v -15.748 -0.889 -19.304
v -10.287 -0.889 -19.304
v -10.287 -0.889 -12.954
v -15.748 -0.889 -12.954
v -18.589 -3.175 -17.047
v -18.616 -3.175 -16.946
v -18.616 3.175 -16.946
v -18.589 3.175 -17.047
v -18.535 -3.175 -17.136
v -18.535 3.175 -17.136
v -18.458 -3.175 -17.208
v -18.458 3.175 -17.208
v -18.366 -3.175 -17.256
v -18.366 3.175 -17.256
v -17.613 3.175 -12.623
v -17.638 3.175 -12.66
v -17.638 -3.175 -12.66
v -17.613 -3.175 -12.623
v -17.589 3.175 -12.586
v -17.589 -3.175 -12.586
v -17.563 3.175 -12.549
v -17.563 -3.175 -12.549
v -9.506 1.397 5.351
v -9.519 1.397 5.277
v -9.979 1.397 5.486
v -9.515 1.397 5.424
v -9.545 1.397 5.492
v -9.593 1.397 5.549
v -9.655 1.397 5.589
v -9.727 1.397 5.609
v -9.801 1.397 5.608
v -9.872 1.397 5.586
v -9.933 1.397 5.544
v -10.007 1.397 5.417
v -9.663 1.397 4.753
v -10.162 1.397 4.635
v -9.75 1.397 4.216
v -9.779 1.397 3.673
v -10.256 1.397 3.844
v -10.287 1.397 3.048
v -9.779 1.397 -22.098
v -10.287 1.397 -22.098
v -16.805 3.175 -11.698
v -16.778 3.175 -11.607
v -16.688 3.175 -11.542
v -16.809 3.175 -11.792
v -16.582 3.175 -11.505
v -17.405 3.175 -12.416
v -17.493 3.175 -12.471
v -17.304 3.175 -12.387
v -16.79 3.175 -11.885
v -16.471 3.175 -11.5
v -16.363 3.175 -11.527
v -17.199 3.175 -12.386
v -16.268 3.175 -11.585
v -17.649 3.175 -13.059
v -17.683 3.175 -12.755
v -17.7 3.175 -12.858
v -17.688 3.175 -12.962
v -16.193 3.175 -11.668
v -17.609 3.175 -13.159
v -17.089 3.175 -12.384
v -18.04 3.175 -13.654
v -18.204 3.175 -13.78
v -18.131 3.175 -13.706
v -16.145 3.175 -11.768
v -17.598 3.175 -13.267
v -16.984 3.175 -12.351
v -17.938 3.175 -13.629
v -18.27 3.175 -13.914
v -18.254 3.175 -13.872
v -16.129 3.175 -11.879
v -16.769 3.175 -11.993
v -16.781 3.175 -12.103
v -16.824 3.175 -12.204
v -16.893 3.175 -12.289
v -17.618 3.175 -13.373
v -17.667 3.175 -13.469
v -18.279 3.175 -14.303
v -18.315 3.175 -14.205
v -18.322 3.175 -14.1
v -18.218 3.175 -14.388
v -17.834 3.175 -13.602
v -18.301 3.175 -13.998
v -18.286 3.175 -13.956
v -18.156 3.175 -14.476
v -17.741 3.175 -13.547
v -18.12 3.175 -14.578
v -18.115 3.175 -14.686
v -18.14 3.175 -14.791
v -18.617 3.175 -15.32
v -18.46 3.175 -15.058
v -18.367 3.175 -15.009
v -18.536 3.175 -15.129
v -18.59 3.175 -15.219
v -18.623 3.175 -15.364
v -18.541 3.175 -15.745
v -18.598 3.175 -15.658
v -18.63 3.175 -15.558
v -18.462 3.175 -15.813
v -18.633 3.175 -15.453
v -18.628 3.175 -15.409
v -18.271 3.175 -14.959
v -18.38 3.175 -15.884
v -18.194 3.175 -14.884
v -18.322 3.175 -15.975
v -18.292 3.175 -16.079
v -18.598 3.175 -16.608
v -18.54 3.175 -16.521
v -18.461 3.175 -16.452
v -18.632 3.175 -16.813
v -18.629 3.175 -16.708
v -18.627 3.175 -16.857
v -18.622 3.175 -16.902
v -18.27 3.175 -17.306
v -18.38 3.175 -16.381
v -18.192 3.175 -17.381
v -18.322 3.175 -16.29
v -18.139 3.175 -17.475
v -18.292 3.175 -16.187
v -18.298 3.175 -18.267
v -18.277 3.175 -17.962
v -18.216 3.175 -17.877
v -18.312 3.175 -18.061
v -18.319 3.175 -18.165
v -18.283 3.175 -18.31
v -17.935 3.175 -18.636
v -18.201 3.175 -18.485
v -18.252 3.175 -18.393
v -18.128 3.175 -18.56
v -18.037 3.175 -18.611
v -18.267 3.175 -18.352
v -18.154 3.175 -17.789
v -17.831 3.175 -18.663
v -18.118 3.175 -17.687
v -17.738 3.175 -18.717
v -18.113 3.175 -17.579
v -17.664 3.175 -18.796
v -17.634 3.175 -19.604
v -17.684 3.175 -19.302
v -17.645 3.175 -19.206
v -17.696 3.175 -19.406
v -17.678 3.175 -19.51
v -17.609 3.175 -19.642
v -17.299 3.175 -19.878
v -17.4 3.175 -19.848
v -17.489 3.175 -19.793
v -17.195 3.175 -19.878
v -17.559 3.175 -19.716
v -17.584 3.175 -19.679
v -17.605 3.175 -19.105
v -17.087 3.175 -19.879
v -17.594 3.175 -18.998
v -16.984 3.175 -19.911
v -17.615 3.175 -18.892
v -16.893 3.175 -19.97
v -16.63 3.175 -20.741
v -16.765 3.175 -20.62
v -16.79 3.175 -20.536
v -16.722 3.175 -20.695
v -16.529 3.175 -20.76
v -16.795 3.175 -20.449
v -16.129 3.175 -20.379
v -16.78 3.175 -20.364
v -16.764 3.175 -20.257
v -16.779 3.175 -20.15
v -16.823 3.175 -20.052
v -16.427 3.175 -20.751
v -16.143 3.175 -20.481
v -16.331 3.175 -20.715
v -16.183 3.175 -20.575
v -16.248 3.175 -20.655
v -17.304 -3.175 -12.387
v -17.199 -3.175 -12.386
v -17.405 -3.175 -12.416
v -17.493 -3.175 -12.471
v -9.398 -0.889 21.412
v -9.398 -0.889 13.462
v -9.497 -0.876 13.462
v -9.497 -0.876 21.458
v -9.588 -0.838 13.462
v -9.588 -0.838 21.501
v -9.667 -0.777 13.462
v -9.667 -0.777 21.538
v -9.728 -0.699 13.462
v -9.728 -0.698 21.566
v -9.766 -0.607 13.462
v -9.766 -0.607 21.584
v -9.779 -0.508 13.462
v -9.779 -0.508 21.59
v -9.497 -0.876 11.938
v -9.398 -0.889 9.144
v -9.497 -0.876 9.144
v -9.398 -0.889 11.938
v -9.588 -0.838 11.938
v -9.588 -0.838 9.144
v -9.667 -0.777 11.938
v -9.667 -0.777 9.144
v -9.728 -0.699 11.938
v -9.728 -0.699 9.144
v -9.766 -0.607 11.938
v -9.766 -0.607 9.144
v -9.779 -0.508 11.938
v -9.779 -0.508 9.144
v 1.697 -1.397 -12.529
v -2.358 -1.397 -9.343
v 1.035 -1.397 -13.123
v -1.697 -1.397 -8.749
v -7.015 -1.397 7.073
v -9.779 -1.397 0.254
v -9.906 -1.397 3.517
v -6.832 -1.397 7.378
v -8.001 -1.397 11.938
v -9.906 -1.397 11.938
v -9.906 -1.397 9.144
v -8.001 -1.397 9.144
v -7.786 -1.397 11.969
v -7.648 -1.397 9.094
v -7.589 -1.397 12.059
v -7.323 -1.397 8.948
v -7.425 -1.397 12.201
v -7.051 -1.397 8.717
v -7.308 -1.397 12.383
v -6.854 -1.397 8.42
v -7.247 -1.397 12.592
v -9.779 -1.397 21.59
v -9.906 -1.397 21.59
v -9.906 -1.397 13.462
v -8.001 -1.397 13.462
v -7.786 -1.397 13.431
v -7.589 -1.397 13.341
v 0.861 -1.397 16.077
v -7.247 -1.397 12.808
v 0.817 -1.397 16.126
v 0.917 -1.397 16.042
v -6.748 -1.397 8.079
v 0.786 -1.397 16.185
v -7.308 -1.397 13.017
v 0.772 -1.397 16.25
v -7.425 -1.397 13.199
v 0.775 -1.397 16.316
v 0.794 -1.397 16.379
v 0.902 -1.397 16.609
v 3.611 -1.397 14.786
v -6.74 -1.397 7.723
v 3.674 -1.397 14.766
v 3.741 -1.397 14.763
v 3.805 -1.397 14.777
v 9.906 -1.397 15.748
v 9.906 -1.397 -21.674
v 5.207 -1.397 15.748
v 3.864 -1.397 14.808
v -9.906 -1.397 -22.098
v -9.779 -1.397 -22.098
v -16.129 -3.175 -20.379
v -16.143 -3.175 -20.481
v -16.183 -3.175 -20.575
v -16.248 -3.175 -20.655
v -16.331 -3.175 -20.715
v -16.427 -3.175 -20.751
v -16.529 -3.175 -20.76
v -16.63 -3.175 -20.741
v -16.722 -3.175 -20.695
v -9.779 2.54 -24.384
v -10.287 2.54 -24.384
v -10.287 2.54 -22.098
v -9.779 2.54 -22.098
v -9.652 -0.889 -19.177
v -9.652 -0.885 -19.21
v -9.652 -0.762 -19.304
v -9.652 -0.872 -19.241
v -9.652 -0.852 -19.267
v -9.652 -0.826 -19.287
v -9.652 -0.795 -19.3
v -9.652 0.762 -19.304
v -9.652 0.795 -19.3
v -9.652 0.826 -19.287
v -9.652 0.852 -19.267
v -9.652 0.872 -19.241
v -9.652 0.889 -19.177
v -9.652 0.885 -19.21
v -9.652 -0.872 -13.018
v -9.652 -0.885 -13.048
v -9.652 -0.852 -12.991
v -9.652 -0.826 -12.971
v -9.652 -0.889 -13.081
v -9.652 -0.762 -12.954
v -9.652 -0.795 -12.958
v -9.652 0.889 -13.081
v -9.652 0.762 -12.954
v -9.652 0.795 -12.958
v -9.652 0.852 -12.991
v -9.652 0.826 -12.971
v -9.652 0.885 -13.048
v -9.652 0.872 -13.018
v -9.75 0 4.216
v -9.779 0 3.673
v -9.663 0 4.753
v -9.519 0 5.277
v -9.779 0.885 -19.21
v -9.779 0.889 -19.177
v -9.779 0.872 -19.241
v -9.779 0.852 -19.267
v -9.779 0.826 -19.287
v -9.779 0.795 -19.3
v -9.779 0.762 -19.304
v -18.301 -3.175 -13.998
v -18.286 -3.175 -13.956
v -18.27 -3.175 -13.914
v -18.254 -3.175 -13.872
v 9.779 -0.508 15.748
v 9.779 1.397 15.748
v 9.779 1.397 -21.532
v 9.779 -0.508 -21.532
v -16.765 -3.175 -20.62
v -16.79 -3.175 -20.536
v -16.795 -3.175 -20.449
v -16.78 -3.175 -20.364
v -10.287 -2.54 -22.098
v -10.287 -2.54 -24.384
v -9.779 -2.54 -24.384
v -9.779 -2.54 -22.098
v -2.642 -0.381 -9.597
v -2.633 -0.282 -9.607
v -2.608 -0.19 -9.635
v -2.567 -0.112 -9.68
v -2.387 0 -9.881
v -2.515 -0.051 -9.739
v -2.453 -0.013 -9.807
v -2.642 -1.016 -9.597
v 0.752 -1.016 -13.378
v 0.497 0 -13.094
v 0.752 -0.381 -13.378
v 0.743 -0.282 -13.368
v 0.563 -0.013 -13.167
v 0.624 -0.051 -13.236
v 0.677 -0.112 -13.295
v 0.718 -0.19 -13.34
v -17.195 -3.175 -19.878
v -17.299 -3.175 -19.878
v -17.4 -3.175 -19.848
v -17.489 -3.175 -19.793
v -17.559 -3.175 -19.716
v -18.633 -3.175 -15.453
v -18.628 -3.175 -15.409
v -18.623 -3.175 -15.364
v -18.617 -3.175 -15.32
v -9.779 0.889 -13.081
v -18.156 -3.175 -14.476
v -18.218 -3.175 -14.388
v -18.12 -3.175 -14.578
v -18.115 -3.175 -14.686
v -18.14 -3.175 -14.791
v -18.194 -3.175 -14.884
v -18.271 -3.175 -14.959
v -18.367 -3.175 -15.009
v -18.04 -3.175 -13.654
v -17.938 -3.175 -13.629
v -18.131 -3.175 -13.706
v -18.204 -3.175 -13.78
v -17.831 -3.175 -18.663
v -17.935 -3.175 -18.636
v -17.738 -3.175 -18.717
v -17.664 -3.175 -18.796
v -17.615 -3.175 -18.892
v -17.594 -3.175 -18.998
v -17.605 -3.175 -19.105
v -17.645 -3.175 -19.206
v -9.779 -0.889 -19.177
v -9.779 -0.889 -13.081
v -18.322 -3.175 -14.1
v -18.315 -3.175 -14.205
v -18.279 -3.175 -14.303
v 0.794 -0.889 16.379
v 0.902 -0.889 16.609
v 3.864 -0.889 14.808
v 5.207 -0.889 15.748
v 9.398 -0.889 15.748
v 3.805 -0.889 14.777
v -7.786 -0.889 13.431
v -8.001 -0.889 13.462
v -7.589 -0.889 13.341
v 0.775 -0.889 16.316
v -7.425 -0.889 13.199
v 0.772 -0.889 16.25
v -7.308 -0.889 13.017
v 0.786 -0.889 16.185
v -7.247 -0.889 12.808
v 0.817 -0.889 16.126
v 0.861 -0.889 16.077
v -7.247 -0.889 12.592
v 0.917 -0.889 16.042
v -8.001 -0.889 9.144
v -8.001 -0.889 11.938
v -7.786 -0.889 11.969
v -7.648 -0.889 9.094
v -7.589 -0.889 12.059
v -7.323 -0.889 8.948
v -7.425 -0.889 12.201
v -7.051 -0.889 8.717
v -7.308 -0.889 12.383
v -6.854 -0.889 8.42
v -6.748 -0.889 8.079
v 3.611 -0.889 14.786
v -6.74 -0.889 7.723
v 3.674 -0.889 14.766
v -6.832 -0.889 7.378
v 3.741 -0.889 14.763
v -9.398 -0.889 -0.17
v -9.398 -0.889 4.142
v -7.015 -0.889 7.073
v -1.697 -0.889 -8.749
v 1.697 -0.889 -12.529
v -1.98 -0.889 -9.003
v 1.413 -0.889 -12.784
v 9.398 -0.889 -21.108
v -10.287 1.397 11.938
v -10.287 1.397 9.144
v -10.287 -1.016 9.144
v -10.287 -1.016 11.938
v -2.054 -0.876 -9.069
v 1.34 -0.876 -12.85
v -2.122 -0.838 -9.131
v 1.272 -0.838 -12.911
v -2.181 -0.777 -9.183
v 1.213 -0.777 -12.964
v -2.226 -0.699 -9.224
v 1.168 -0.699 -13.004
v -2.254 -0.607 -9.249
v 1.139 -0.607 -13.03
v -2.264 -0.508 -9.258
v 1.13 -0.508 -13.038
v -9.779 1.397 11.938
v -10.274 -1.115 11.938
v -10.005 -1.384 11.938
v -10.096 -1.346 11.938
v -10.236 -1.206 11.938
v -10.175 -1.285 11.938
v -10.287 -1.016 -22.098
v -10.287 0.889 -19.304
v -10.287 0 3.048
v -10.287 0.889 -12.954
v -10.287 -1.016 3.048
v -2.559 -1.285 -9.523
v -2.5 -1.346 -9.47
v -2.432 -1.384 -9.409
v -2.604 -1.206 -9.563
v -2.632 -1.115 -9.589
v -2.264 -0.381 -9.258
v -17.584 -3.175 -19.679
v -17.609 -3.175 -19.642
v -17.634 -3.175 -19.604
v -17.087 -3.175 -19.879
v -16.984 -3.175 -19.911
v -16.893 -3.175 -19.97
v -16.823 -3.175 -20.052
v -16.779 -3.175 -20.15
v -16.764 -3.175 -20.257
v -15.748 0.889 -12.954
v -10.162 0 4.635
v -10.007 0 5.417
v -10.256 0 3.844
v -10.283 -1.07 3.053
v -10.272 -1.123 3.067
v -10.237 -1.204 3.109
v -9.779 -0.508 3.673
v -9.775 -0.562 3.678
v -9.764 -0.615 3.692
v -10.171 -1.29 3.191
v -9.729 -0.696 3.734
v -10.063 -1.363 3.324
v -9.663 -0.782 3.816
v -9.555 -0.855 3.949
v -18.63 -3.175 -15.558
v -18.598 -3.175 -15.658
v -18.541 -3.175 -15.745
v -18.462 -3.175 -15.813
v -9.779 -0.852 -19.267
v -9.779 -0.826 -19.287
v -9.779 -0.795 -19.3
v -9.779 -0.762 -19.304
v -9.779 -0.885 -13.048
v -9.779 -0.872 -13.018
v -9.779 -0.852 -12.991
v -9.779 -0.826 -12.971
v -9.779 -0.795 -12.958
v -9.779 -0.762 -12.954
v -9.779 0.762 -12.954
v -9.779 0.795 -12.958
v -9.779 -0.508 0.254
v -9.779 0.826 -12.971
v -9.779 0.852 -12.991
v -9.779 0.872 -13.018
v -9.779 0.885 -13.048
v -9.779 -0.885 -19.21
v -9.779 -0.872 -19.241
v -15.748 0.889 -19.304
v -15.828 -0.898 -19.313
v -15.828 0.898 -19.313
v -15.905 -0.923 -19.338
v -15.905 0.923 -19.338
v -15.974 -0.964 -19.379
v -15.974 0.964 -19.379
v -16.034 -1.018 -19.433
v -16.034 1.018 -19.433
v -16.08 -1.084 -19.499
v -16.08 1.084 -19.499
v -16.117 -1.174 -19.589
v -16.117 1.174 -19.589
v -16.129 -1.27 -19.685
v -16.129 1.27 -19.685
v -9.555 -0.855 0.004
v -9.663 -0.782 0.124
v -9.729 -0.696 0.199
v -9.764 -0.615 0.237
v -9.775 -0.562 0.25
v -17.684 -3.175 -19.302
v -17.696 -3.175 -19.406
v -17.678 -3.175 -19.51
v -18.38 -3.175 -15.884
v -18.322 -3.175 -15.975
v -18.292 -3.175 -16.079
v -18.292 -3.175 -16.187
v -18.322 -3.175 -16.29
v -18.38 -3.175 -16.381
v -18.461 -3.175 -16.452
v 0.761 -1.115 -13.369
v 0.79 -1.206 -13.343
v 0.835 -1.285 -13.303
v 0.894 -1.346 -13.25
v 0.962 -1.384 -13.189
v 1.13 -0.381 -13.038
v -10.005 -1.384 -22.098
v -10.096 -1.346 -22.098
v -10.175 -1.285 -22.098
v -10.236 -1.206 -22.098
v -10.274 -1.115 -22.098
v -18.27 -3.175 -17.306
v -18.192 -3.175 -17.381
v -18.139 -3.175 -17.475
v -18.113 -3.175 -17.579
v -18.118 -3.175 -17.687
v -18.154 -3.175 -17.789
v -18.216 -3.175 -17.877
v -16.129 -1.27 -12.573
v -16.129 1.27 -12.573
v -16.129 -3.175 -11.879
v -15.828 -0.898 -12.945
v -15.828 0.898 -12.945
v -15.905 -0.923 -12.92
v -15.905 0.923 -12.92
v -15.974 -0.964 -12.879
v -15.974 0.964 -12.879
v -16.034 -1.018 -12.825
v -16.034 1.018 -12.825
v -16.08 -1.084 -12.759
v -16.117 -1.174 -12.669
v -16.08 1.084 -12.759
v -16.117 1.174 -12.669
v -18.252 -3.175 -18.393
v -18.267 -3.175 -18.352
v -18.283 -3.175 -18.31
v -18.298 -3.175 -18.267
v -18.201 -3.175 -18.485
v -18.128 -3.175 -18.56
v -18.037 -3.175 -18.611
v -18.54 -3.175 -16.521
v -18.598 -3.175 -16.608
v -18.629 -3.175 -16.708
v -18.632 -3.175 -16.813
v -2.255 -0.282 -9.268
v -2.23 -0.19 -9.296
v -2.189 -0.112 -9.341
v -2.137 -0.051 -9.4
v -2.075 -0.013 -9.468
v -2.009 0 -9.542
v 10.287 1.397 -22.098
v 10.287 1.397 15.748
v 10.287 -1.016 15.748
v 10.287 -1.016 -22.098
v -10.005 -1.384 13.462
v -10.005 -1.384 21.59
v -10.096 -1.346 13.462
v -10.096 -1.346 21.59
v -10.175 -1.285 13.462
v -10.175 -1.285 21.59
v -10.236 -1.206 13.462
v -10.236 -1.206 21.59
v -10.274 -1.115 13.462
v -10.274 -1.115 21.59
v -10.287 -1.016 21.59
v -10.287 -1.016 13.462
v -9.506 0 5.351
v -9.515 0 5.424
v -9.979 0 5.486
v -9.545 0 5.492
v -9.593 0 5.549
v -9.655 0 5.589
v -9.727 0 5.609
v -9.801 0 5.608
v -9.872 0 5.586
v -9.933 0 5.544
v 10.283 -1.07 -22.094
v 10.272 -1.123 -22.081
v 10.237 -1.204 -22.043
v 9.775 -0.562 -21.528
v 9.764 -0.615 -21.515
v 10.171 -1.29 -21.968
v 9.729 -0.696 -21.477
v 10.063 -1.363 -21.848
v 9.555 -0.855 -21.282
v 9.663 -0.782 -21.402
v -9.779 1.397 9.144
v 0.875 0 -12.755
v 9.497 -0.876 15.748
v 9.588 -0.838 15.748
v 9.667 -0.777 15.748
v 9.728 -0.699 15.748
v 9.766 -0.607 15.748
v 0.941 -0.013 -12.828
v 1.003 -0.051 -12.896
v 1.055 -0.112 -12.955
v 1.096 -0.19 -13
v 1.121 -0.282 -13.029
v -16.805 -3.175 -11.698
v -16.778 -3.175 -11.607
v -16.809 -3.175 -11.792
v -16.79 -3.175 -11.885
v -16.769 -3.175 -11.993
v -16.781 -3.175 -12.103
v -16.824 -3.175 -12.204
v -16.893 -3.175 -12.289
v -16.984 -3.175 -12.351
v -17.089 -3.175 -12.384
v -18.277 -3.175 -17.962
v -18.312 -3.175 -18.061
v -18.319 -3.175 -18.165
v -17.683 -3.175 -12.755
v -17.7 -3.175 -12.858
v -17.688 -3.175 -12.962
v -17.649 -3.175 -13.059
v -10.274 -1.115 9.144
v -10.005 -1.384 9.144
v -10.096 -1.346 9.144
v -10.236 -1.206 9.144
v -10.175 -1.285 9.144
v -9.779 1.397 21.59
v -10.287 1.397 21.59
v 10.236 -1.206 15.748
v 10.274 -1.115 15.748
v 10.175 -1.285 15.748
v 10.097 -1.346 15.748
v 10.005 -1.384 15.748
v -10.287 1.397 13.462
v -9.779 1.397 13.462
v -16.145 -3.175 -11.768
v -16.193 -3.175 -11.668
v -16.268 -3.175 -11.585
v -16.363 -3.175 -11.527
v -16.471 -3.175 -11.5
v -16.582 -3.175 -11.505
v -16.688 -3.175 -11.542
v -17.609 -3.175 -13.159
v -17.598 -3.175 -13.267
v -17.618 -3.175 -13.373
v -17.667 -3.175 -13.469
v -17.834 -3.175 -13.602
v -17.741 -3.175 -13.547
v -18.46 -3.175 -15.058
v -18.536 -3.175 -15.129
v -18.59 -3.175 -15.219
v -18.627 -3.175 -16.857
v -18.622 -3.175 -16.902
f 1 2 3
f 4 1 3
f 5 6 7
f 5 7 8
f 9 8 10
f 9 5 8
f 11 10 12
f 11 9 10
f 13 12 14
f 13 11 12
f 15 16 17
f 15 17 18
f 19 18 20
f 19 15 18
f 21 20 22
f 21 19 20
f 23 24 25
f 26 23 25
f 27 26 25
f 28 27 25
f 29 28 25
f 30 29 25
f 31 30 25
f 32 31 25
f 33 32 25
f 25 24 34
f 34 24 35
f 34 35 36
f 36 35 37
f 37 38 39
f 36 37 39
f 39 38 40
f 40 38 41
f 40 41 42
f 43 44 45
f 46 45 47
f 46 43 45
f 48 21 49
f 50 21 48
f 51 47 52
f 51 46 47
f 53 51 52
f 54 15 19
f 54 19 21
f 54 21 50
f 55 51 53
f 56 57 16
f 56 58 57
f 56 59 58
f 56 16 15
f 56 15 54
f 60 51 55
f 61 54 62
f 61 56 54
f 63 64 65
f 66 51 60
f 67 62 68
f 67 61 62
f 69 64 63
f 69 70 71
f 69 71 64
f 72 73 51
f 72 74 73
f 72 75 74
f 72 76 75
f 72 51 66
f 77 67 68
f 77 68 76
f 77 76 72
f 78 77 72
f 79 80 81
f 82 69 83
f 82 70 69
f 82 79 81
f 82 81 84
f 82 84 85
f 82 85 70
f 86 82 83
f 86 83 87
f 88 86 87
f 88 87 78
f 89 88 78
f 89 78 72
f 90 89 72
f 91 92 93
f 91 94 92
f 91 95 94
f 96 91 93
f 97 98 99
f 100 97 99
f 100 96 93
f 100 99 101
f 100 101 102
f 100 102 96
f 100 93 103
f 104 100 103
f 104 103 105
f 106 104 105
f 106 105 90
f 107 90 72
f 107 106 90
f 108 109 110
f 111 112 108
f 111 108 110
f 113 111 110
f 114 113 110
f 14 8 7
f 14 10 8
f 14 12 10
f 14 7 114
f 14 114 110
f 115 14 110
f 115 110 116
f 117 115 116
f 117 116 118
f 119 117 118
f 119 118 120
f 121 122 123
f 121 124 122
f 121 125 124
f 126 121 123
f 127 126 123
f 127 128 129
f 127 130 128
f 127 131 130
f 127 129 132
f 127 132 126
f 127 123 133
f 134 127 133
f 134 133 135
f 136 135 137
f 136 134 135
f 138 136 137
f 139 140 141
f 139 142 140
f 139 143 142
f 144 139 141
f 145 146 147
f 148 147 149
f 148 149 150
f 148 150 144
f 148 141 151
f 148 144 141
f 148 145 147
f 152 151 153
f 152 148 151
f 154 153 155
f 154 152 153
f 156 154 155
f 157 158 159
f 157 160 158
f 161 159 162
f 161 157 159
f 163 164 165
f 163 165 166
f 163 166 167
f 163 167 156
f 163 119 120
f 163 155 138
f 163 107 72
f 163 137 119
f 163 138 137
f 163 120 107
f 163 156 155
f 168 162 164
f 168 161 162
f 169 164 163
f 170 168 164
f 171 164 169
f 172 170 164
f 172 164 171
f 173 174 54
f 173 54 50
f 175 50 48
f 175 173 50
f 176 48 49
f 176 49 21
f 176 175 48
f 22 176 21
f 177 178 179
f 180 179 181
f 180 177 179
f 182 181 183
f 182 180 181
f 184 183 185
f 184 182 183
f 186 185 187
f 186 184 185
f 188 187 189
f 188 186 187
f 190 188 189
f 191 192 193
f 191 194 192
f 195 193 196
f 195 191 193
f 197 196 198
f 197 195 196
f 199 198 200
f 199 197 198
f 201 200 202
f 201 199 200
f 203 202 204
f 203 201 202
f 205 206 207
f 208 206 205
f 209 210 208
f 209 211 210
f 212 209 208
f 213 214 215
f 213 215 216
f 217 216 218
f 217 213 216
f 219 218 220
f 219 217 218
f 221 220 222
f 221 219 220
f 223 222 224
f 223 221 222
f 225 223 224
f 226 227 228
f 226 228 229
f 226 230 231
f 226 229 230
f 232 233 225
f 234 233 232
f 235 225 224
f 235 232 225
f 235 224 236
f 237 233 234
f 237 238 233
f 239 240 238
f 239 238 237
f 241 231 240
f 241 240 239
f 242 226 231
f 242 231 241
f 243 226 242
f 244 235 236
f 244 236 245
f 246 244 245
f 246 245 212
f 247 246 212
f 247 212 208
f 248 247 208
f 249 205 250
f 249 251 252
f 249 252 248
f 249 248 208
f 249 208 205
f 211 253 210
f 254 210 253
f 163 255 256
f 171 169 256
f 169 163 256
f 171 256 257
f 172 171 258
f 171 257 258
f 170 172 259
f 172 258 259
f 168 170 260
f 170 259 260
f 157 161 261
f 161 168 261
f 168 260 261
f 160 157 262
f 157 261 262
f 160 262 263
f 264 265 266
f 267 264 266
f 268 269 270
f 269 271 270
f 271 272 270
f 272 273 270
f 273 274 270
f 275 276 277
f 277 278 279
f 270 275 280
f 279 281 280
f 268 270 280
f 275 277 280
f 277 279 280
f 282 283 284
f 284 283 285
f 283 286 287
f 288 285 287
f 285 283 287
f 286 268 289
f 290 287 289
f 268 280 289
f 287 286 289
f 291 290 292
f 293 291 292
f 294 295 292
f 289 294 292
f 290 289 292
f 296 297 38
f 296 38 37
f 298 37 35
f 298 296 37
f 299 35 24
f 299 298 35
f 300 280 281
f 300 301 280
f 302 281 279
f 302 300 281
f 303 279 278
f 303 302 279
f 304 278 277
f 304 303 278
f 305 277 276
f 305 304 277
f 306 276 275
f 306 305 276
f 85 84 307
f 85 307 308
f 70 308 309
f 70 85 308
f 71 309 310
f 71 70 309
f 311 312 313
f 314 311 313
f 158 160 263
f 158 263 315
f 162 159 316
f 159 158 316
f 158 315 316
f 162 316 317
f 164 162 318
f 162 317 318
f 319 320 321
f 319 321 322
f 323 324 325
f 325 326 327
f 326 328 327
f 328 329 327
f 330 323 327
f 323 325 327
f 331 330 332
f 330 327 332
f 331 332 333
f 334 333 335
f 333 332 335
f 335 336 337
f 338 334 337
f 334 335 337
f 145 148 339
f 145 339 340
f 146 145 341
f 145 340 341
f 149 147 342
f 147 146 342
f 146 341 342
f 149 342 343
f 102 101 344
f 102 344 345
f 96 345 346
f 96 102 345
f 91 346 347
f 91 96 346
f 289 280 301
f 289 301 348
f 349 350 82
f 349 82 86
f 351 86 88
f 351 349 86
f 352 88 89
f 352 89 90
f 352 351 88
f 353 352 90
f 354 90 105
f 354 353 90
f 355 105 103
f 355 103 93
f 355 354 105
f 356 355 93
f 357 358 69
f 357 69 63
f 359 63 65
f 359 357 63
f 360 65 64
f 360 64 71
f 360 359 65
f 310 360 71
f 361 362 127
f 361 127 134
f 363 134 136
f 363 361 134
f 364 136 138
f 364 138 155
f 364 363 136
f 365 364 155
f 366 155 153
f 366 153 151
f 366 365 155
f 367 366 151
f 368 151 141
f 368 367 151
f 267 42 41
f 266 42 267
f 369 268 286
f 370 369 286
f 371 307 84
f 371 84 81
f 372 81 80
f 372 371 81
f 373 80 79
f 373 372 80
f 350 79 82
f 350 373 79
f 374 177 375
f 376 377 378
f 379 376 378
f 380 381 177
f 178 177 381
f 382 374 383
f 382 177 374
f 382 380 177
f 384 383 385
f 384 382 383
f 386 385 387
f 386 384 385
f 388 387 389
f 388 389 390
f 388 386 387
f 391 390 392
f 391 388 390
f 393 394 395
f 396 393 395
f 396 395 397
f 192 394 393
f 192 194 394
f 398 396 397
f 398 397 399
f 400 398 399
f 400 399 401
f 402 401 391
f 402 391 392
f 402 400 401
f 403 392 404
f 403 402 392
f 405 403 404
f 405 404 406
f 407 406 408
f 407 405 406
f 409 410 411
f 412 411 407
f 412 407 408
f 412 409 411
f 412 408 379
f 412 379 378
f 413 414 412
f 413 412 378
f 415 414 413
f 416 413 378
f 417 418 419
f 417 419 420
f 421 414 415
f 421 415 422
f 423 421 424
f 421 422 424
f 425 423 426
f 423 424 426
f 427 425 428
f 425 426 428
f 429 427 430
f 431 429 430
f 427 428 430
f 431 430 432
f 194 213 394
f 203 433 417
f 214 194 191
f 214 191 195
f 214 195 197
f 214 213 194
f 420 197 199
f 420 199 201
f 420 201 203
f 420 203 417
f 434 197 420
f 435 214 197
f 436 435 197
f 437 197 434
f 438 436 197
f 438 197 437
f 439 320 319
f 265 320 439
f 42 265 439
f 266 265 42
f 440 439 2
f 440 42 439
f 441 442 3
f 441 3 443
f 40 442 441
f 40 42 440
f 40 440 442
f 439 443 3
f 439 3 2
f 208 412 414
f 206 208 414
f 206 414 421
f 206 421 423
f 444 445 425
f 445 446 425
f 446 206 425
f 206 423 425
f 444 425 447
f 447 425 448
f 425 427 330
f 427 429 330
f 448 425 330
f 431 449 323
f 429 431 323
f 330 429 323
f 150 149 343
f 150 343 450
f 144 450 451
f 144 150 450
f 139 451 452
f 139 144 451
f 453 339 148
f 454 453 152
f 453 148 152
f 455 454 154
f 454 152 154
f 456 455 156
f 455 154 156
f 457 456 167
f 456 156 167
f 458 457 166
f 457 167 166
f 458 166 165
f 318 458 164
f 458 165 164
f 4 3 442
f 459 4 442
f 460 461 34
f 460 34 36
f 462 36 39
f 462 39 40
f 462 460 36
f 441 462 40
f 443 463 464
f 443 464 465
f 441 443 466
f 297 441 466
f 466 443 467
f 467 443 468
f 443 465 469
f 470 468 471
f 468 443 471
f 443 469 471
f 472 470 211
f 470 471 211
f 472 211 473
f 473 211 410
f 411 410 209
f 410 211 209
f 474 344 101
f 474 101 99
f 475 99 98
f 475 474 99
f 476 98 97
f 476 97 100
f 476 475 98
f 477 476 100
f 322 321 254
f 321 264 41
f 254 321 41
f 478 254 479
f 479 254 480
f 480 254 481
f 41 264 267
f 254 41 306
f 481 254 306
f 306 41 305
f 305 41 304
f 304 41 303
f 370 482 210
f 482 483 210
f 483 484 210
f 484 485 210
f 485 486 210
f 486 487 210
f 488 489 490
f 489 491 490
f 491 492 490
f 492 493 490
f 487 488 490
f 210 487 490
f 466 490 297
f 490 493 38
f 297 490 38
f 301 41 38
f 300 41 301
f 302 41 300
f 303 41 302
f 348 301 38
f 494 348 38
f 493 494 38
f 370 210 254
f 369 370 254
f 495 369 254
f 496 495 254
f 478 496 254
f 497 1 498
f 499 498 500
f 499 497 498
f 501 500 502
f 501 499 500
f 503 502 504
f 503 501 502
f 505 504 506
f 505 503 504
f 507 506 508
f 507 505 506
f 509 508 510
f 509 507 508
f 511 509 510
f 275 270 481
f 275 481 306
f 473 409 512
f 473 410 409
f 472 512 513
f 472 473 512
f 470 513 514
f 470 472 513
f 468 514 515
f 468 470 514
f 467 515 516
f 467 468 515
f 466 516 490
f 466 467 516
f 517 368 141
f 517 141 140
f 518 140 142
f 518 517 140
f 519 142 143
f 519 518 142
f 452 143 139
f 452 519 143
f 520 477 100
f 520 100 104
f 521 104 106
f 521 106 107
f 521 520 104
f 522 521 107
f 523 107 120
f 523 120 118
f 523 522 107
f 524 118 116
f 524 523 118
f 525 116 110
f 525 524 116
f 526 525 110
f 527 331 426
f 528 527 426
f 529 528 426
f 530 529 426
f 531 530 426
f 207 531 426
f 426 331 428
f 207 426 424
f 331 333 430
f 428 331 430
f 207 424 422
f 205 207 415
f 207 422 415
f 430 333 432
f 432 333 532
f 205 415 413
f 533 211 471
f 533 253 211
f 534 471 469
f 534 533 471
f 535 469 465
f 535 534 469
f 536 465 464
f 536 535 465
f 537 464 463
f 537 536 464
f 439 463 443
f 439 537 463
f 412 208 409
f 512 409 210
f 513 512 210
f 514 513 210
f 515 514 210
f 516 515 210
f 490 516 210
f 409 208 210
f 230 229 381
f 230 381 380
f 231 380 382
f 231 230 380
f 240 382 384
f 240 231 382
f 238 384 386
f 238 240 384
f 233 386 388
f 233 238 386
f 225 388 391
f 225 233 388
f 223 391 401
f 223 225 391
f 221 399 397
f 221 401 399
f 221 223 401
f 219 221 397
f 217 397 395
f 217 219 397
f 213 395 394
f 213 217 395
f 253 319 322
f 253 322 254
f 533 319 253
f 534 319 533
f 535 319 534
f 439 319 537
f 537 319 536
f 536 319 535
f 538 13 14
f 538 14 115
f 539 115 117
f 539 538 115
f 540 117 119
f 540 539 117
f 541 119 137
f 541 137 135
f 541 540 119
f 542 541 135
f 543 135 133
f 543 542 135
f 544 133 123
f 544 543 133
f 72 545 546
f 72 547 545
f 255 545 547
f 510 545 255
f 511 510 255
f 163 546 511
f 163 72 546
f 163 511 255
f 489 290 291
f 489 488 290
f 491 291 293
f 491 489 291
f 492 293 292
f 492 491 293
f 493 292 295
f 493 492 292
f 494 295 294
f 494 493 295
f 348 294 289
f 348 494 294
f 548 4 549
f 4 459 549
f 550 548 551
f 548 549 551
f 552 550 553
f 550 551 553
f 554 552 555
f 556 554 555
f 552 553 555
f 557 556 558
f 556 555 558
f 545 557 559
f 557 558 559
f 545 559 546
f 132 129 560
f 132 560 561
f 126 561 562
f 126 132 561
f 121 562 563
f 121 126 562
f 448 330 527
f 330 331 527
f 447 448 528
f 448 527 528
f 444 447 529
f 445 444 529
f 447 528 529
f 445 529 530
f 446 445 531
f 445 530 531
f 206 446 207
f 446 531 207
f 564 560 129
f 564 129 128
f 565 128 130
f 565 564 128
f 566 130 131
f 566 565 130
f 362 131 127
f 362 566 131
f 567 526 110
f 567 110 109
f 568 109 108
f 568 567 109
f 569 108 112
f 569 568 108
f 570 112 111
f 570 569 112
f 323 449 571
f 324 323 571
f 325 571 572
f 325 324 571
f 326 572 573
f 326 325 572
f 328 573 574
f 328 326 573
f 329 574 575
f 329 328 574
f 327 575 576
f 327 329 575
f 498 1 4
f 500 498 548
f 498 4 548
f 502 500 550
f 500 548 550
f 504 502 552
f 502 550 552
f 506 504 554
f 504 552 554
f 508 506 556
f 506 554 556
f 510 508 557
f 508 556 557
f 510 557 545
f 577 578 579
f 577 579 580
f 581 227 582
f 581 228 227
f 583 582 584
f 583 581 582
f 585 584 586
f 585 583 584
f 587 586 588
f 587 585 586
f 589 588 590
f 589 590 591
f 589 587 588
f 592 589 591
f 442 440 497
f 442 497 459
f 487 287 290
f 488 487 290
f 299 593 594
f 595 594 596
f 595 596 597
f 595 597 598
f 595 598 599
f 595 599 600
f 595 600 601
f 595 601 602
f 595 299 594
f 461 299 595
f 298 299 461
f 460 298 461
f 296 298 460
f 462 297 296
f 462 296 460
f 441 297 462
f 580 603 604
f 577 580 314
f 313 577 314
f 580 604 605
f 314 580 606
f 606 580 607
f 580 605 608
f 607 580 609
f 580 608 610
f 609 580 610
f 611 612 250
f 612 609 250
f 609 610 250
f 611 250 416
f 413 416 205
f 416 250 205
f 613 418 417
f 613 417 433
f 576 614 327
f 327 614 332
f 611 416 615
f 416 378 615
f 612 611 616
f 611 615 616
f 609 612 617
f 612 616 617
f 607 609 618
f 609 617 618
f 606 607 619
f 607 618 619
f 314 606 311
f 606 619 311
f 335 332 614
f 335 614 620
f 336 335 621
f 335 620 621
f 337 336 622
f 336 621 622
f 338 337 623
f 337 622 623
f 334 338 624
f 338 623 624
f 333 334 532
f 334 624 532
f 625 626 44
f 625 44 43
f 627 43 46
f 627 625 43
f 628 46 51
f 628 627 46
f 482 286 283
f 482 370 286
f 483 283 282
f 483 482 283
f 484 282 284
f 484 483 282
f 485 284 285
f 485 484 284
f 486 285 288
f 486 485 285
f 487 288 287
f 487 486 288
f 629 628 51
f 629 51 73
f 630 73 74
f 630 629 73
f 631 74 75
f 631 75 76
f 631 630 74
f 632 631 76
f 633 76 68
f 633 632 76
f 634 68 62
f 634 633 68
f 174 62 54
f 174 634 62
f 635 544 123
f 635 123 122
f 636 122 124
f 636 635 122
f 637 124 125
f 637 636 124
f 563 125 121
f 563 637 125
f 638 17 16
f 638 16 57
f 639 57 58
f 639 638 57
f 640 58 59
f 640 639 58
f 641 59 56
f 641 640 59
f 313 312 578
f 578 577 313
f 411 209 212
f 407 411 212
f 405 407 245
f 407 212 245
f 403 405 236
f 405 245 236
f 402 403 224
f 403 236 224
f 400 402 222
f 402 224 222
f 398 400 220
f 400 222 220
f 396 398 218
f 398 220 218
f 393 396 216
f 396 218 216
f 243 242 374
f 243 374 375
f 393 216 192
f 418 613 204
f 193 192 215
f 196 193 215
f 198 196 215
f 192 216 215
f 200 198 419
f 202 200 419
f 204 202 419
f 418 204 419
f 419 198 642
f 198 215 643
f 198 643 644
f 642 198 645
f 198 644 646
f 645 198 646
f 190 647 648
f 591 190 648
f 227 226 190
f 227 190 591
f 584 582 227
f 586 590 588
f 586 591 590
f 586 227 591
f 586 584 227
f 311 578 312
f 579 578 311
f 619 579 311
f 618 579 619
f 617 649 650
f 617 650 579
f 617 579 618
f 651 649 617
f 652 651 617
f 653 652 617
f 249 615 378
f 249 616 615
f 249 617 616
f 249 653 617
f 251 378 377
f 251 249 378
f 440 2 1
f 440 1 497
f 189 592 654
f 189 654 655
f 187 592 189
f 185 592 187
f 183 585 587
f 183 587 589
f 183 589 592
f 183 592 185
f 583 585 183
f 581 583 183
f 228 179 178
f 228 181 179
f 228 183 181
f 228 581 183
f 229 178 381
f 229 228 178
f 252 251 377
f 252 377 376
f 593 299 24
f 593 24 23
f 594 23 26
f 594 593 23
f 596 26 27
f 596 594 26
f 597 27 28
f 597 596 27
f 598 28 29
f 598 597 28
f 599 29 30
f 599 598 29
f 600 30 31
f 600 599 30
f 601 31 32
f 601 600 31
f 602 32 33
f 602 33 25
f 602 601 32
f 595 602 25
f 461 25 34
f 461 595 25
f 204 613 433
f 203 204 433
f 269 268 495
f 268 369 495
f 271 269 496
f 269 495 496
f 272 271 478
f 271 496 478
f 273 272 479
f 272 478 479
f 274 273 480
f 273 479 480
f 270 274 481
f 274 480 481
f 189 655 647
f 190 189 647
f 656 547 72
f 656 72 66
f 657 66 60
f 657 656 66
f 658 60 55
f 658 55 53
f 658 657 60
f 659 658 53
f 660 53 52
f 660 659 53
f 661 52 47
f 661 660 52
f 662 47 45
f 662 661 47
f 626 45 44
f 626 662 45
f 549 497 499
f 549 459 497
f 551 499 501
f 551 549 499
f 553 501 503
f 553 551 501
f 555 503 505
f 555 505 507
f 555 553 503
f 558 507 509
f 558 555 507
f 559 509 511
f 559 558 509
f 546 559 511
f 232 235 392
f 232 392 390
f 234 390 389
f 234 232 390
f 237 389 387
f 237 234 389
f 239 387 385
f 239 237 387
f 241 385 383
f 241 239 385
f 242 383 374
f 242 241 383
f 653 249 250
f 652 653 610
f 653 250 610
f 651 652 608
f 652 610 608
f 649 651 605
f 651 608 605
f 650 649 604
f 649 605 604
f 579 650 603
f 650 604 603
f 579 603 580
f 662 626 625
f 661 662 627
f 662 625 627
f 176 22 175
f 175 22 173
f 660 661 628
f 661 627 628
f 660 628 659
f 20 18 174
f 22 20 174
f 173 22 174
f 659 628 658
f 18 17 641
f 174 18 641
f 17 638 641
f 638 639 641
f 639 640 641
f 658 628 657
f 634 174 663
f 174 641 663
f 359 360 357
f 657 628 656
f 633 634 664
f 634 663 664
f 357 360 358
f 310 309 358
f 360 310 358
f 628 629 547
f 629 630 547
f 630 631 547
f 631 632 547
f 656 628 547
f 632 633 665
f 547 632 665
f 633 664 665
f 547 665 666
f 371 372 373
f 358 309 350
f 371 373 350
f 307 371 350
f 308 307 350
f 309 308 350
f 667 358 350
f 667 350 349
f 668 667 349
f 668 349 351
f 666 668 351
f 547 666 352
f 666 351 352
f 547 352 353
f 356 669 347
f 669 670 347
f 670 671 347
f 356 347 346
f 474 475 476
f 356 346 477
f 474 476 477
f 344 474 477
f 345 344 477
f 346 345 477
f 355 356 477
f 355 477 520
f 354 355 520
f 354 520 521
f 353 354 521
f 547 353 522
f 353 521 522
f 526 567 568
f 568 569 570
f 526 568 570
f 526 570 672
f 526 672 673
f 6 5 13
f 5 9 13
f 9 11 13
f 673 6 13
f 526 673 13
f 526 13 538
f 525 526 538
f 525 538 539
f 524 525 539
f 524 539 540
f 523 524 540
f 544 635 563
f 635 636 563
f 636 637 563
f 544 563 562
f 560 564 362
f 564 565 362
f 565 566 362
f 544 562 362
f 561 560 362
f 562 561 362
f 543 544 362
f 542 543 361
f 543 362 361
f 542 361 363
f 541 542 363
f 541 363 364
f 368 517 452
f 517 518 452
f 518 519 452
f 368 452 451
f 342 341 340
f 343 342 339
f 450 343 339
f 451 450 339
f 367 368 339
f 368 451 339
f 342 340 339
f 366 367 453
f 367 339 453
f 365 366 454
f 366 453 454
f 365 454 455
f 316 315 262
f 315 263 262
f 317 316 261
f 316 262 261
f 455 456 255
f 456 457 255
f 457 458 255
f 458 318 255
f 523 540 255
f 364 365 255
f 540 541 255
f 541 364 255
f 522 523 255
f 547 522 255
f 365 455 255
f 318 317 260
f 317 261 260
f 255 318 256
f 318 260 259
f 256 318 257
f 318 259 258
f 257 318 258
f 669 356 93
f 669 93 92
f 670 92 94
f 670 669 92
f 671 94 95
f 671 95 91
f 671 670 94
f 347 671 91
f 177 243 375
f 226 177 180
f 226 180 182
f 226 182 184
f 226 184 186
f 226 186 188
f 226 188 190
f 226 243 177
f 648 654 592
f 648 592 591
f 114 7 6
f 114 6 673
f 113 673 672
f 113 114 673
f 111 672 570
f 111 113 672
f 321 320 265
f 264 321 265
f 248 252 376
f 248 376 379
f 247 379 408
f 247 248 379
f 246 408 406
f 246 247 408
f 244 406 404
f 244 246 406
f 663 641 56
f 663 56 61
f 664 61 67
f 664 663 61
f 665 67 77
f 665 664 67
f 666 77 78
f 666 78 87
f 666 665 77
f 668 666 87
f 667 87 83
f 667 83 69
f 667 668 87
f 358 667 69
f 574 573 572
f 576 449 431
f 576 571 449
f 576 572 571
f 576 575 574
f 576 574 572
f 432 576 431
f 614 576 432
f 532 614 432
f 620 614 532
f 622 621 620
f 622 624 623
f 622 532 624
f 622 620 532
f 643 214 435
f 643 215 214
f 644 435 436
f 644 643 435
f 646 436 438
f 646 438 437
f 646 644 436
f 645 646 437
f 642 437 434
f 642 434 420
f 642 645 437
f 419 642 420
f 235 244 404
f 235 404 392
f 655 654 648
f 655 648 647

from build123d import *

# Parameters (mm, degrees)
SKETCH1_W                = 20.574
SKETCH1_H                = 44.196
BOSS_EXTRUDE1_DEPTH      = 1.397
SHELL1_T                 = -0.508
CUT_EXTRUDE1_DEPTH       = 25.415068749
CUT_EXTRUDE1_DEPTH_BACK  = 25.415068749
CUT_EXTRUDE2_DEPTH       = 25.415068749
CUT_EXTRUDE2_DEPTH_BACK  = 25.415068749
SKETCH5_W                = 2.286
SKETCH5_H                = 5.08
BOSS_EXTRUDE2_DEPTH      = 0.508
BOSS_EXTRUDE3_DEPTH      = 5.842
BOSS_EXTRUDE3_DEPTH_BACK = 0.635
SKETCH6_W                = 6.35
SKETCH6_H                = 1.778
BOSS_EXTRUDE4_DEPTH      = 3.175
SKETCH8_R                = 0.381
CUT_EXTRUDE3_DEPTH       = 31.873801871
FILLET1_R                = 0.381
CIRPATTERN1_START        = -3.175
CIRPATTERN1_DEPTH        = 6.35
CUT_EXTRUDE4_DEPTH       = 31.853319649
CUT_EXTRUDE4_DEPTH_BACK  = 31.853319649
BOSS_EXTRUDE5_DEPTH      = 1.397
BOSS_EXTRUDE6_REACH      = 32.853
SHELL2_START             = -7.869211645
SHELL2_OUTLINE_W         = 5.08
SHELL2_OUTLINE_H         = 0.889
SHELL2_DEPTH             = 0.762
FILLET2_R                = 0.381
FILLET6_R                = 0.127


# Read off the part's stored shape, not the designer's step: CirPattern1, Shell2
with BuildPart() as part:
    # Sketch1 → Boss-Extrude1 (new, symmetric)
    with BuildSketch(Plane(origin=(0, 0, 0), x_dir=(1, 0, 0), z_dir=(0, 1, 0))):
        Rectangle(SKETCH1_W, SKETCH1_H)
    extrude(amount=BOSS_EXTRUDE1_DEPTH, both=True)

    # Shell1
    shell1_openings = [part.faces().sort_by_distance(p)[0] for p in [
        (0, 1.397, 0),
    ]]
    offset(amount=SHELL1_T, openings=shell1_openings, kind=Kind.INTERSECTION)

    # Sketch3 → Cut-Extrude1 (cut, two sides: drawn at the far end of the back side and taken through both)
    with BuildSketch(Plane(origin=(0, 0, 0), x_dir=(1, 0, 0), z_dir=(0, 1, 0)).offset(-CUT_EXTRUDE1_DEPTH_BACK)):
        Polygon((10.287, 22.098), (-9.779, -0.254), (-9.779, 22.098), align=None)
    extrude(amount=CUT_EXTRUDE1_DEPTH + CUT_EXTRUDE1_DEPTH_BACK, mode=Mode.SUBTRACT)

    # Sketch4 → Cut-Extrude2 (cut, two sides: drawn at the far end of the back side and taken through both)
    with BuildSketch(Plane(origin=(0, 0, 0), x_dir=(1, 0, 0), z_dir=(0, 1, 0)).offset(-CUT_EXTRUDE2_DEPTH_BACK)):
        with BuildLine():
            Line((-10.287, -22.098), (10.287, -22.098))
            Line((10.287, -22.098), (10.287, -15.748))
            Line((10.287, -15.748), (5.207, -15.748))
            Line((5.207, -15.748), (3.864134037, -14.80771513))
            ThreePointArc((3.864134037, -14.80771513), (3.740583181, -14.762746296), (3.611100584, -14.785577571))
            Line((3.611100584, -14.785577571), (0.917342395, -16.041697644))
            ThreePointArc((0.917342395, -16.041697644), (0.786005508, -16.185026705), (0.794485256, -16.37924486))
            Line((0.794485256, -16.37924486), (0.901830294, -16.609447038))
            Line((0.901830294, -16.609447038), (-9.779, -21.59))
            Line((-9.779, -21.59), (-10.287, -21.59))
            Line((-10.287, -21.59), (-10.287, -22.098))
        make_face()
    extrude(amount=CUT_EXTRUDE2_DEPTH + CUT_EXTRUDE2_DEPTH_BACK, mode=Mode.SUBTRACT)

    # Sketch5 → Boss-Extrude2 (add)
    with BuildSketch(Plane.ZY.offset(10.287)):
        with Locations((-23.241, 0)):
            Rectangle(SKETCH5_W, SKETCH5_H)
    extrude(amount=-BOSS_EXTRUDE2_DEPTH)

    # Sketch6 → Boss-Extrude3 (add, two sides: drawn at the far end of the back side and taken through both)
    with BuildSketch(Plane.ZY.offset(10.287).offset(-BOSS_EXTRUDE3_DEPTH_BACK)):
        with Locations((-16.129, 0)):
            Rectangle(SKETCH6_W, SKETCH6_H)
    extrude(amount=BOSS_EXTRUDE3_DEPTH + BOSS_EXTRUDE3_DEPTH_BACK)

    # Sketch7 → Boss-Extrude4 (add, symmetric)
    with BuildSketch(Plane(origin=(0, 0, 0), x_dir=(1, 0, 0), z_dir=(0, 1, 0))):
        with BuildLine():
            Line((-16.129, 11.049), (-16.129, 21.209))
            ThreePointArc((-16.129, 21.209), (-18.669, 16.129), (-16.129, 11.049))
        make_face()
    extrude(amount=BOSS_EXTRUDE4_DEPTH, both=True)

    # Sketch8 → Cut-Extrude3 (cut, symmetric)
    with BuildSketch(Plane(origin=(0, 0, 0), x_dir=(1, 0, 0), z_dir=(0, 1, 0))):
        with Locations((-17.145, 20.25601151)):
            Circle(SKETCH8_R)
    extrude(amount=CUT_EXTRUDE3_DEPTH, both=True, mode=Mode.SUBTRACT)

    # Fillet1
    # the kernel refuses this fillet: 0.381 mm, written as the material it takes off along each edge
    with BuildSketch(Plane(origin=(-16.129, -5.314598451, -21.209), x_dir=(0, 0, 1), z_dir=(0, 1, 0))) as fillet1_piece_1:
        with BuildLine():
            CenterArc((0.829767065, -0.381), FILLET1_R, 90, 134.597956661)
            ThreePointArc((0.558475601, -0.648510638), (0.268299759, -0.333674793), (0, 0))
            Line((0, 0), (0.829767065, 0))
        make_face()
    extrude(amount=10.629196903, mode=Mode.SUBTRACT)
    with BuildSketch(Plane(origin=(-16.888803964, -3.924719523, -20.538012558), x_dir=(0.5312847358041962, 0, 0.8471933247502991), z_dir=(0, 1, 0))) as fillet1_piece_2:
        with BuildLine():
            CenterArc((0.308389086, 0.366870424), FILLET1_R, 191.227508383, 63.119725462)
            ThreePointArc((-0.065319255, 0.292687706), (-0.034387693, 0.1459582), (0, 0))
            ThreePointArc((0, 0), (0.102796362, 0.014129576), (0.205592724, 0))
        make_face()
    extrude(amount=7.849439047, mode=Mode.SUBTRACT)
    with BuildSketch(Plane(origin=(-17.383822436, -3.924719523, -19.95915322), x_dir=(0.919383333537804, 0, 0.39336279185112943), z_dir=(0, 1, 0))) as fillet1_piece_3:
        with BuildLine():
            CenterArc((0.308389086, -0.366870424), FILLET1_R, 105.652766155, 63.119725462)
            ThreePointArc((-0.065319255, -0.292687706), (-0.034387693, -0.1459582), (0, 0))
            ThreePointArc((0, 0), (0.102796362, -0.014129576), (0.205592724, 0))
        make_face()
    extrude(amount=7.849439047, mode=Mode.SUBTRACT)

    # CirPattern1 outline → CirPattern1 (cut)
    with BuildSketch(Plane(origin=(0, 0, 0), x_dir=(1, 0, 0), z_dir=(0, 1, 0)).offset(CIRPATTERN1_START)):
        with BuildLine():
            ThreePointArc((-16.777510638, 11.607475601), (-16.809726428, 11.745008607), (-16.789621511, 11.884826264))
            ThreePointArc((-16.789621511, 11.884826264), (-16.855265692, 12.249273725), (-17.19948569, 12.38581567))
            ThreePointArc((-17.19948569, 12.38581567), (-17.404514793, 12.415873831), (-17.563486704, 12.548796206))
            ThreePointArc((-17.563486704, 12.548796206), (-17.193275379, 12.059117997), (-16.777510638, 11.607475601))
        make_face()
        with BuildLine():
            ThreePointArc((-16.129, 11.878767065), (-16.36296353, 11.527282675), (-16.777510638, 11.607475601))
            ThreePointArc((-16.777510638, 11.607475601), (-16.462674793, 11.317299759), (-16.129, 11.049))
            Line((-16.129, 11.049), (-16.129, 11.878767065))
        make_face()
        with BuildLine():
            ThreePointArc((-17.633655181, 19.604189248), (-17.975088939, 19.015374527), (-18.251537846, 18.393397205))
            ThreePointArc((-18.251537846, 18.393397205), (-18.127780644, 18.559603646), (-17.935337257, 18.63645395))
            ThreePointArc((-17.935337257, 18.63645395), (-17.635723603, 18.842192055), (-17.644932405, 19.20552621))
            ThreePointArc((-17.644932405, 19.20552621), (-17.695623525, 19.406451162), (-17.633655181, 19.604189248))
        make_face()
        with BuildLine():
            ThreePointArc((-18.298077653, 18.26748788), (-18.492621503, 17.615236028), (-18.616234382, 16.945908274))
            ThreePointArc((-18.616234382, 16.945908274), (-18.534696725, 17.136412963), (-18.365510912, 17.256064903))
            ThreePointArc((-18.365510912, 17.256064903), (-18.122204213, 17.526061867), (-18.215977249, 17.877207318))
            ThreePointArc((-18.215977249, 17.877207318), (-18.312172768, 18.060747091), (-18.298077653, 18.26748788))
        make_face()
        with BuildLine():
            ThreePointArc((-18.632095343, 16.812613331), (-18.66899876, 16.132967891), (-18.632944744, 15.453276862))
            ThreePointArc((-18.632944744, 15.453276862), (-18.598132415, 15.657552479), (-18.46155341, 15.81339407))
            ThreePointArc((-18.46155341, 15.81339407), (-18.287998835, 16.132729817), (-18.461154191, 16.452282211))
            ThreePointArc((-18.461154191, 16.452282211), (-18.59753833, 16.608294367), (-18.632095343, 16.812613331))
        make_face()
        with BuildLine():
            ThreePointArc((-18.617250379, 15.319962201), (-18.494474074, 14.650480486), (-18.300745514, 13.997986017))
            ThreePointArc((-18.300745514, 13.997986017), (-18.314582249, 14.20474426), (-18.218157429, 14.388163671))
            ThreePointArc((-18.218157429, 14.388163671), (-18.12394563, 14.739191657), (-18.366914716, 15.009492478))
            ThreePointArc((-18.366914716, 15.009492478), (-18.535950864, 15.129355761), (-18.617250379, 15.319962201))
        make_face()
        with BuildLine():
            ThreePointArc((-18.254363096, 13.872018629), (-17.978691709, 13.249696306), (-17.637994075, 12.660455345))
            ThreePointArc((-17.637994075, 12.660455345), (-17.699715253, 12.85827072), (-17.64877307, 13.059132165))
            ThreePointArc((-17.64877307, 13.059132165), (-17.639110206, 13.422454528), (-17.93846651, 13.628566908))
            ThreePointArc((-17.93846651, 13.628566908), (-18.130813704, 13.705657654), (-18.254363096, 13.872018629))
        make_face()
    extrude(amount=CIRPATTERN1_DEPTH, mode=Mode.SUBTRACT)

    # Sketch9 → Cut-Extrude4 (cut, two sides: drawn at the far end of the back side and taken through both)
    with BuildSketch(Plane(origin=(0, 0, 0), x_dir=(1, 0, 0), z_dir=(0, 1, 0)).offset(-CUT_EXTRUDE4_DEPTH_BACK)):
        with BuildLine():
            Line((-8.001, -11.938), (-10.287, -11.938))
            Line((-10.287, -11.938), (-10.287, -13.462))
            Line((-10.287, -13.462), (-8.001, -13.462))
            ThreePointArc((-8.001, -13.462), (-7.239, -12.7), (-8.001, -11.938))
        make_face()
        with BuildLine():
            Line((-8.001, -9.144), (-10.287, -9.144))
            Line((-10.287, -9.144), (-10.287, -3.048))
            Line((-10.287, -3.048), (-7.015482933, -7.0729656))
            ThreePointArc((-7.015482933, -7.0729656), (-6.854218921, -8.419704275), (-8.001, -9.144))
        make_face()
    extrude(amount=CUT_EXTRUDE4_DEPTH + CUT_EXTRUDE4_DEPTH_BACK, mode=Mode.SUBTRACT)

    # Sketch10 → Boss-Extrude5 (add)
    with BuildSketch(Plane(origin=(0, 0, 0), x_dir=(1, 0, 0), z_dir=(0, 1, 0))):
        with BuildLine():
            Line((-10.287, -3.048), (-9.779, -3.672995219))
            ThreePointArc((-9.779, -3.672995219), (-9.713577615, -4.485652185), (-9.518995533, -5.277377672))
            ThreePointArc((-9.518995533, -5.277377672), (-9.690211017, -5.601822413), (-10.00699519, -5.416817226))
            ThreePointArc((-10.00699519, -5.416817226), (-10.216755971, -4.240654366), (-10.287, -3.048))
        make_face()
    extrude(amount=BOSS_EXTRUDE5_DEPTH)

    # Boss-Extrude6: up to this face of the body (flat: up to its plane)
    boss_extrude6_end = Plane(part.part.faces().sort_by_distance((1.063267264, -1.397, 2.310847226))[0])
    # Sketch11 → Boss-Extrude6 (add, up to the picked face)
    with BuildSketch(Plane(origin=(0, 0, 0), x_dir=(1, 0, 0), z_dir=(0, 1, 0)), mode=Mode.PRIVATE) as boss_extrude6_sk1:
        Polygon((-1.696795769, 8.748961675), (-2.641846577, 9.59735956), (0.751744961, 13.377562792), (1.696795769, 12.529164907), align=None)
    boss_extrude6_tool1 = split(extrude(boss_extrude6_sk1.sketch, amount=-BOSS_EXTRUDE6_REACH, mode=Mode.PRIVATE), bisect_by=boss_extrude6_end, keep=Keep.BOTH, mode=Mode.PRIVATE)
    add(boss_extrude6_tool1.solids().sort_by(Axis((-0.472525, 0, -11.063262), (0, -1, 0)))[0])

    # Shell2 outline → Shell2 (cut)
    with BuildSketch(Plane(origin=(0, 0, 0), x_dir=(0.668029830269147, 0, -0.7441344944770231), z_dir=(0.7441344944770231, 0, 0.6680298302691471)).offset(SHELL2_START)):
        with Locations((7.916893984, -0.4445)):
            Rectangle(SHELL2_OUTLINE_W, SHELL2_OUTLINE_H)
    extrude(amount=SHELL2_DEPTH, mode=Mode.SUBTRACT)

    # Fillet2
    fillet2_edges = [part.edges().sort_by_distance(p)[0] for p in [
        (-16.129, 0, -19.304),
        (-16.129, -0.889, -16.129),
        (-16.129, 0, -12.954),
        (-16.129, 0.889, -16.129),
        (-9.779, -0.889, 1.963497609),
        (-9.779, -0.889, 10.541),
        (-9.779, -0.889, 17.526),
        (-10.287, -1.397, 10.541),
        (-10.287, -1.397, 17.526),
        (0.940755122, 0, -13.207883215),
        (-2.452836415, 0, -9.427679983),
        (-0.945050808, -1.397, -11.487461176),
        (-0.567030485, -0.889, -11.148102022),
        (9.779, -0.889, -2.892063291),
        (10.287, -1.397, -3.175),
        (-10.287, -1.397, -9.525),
    ]]
    fillet(fillet2_edges, radius=FILLET2_R)

    # Fillet6
    fillet6_edges = [part.edges().sort_by_distance(p)[0] for p in [
        (-9.7155, -0.889, -19.304),
        (-9.7155, 0.889, -19.304),
        (-9.7155, 0.889, -12.954),
        (-9.7155, -0.889, -12.954),
    ]]
    fillet(fillet6_edges, radius=FILLET6_R)


solid = part.part
